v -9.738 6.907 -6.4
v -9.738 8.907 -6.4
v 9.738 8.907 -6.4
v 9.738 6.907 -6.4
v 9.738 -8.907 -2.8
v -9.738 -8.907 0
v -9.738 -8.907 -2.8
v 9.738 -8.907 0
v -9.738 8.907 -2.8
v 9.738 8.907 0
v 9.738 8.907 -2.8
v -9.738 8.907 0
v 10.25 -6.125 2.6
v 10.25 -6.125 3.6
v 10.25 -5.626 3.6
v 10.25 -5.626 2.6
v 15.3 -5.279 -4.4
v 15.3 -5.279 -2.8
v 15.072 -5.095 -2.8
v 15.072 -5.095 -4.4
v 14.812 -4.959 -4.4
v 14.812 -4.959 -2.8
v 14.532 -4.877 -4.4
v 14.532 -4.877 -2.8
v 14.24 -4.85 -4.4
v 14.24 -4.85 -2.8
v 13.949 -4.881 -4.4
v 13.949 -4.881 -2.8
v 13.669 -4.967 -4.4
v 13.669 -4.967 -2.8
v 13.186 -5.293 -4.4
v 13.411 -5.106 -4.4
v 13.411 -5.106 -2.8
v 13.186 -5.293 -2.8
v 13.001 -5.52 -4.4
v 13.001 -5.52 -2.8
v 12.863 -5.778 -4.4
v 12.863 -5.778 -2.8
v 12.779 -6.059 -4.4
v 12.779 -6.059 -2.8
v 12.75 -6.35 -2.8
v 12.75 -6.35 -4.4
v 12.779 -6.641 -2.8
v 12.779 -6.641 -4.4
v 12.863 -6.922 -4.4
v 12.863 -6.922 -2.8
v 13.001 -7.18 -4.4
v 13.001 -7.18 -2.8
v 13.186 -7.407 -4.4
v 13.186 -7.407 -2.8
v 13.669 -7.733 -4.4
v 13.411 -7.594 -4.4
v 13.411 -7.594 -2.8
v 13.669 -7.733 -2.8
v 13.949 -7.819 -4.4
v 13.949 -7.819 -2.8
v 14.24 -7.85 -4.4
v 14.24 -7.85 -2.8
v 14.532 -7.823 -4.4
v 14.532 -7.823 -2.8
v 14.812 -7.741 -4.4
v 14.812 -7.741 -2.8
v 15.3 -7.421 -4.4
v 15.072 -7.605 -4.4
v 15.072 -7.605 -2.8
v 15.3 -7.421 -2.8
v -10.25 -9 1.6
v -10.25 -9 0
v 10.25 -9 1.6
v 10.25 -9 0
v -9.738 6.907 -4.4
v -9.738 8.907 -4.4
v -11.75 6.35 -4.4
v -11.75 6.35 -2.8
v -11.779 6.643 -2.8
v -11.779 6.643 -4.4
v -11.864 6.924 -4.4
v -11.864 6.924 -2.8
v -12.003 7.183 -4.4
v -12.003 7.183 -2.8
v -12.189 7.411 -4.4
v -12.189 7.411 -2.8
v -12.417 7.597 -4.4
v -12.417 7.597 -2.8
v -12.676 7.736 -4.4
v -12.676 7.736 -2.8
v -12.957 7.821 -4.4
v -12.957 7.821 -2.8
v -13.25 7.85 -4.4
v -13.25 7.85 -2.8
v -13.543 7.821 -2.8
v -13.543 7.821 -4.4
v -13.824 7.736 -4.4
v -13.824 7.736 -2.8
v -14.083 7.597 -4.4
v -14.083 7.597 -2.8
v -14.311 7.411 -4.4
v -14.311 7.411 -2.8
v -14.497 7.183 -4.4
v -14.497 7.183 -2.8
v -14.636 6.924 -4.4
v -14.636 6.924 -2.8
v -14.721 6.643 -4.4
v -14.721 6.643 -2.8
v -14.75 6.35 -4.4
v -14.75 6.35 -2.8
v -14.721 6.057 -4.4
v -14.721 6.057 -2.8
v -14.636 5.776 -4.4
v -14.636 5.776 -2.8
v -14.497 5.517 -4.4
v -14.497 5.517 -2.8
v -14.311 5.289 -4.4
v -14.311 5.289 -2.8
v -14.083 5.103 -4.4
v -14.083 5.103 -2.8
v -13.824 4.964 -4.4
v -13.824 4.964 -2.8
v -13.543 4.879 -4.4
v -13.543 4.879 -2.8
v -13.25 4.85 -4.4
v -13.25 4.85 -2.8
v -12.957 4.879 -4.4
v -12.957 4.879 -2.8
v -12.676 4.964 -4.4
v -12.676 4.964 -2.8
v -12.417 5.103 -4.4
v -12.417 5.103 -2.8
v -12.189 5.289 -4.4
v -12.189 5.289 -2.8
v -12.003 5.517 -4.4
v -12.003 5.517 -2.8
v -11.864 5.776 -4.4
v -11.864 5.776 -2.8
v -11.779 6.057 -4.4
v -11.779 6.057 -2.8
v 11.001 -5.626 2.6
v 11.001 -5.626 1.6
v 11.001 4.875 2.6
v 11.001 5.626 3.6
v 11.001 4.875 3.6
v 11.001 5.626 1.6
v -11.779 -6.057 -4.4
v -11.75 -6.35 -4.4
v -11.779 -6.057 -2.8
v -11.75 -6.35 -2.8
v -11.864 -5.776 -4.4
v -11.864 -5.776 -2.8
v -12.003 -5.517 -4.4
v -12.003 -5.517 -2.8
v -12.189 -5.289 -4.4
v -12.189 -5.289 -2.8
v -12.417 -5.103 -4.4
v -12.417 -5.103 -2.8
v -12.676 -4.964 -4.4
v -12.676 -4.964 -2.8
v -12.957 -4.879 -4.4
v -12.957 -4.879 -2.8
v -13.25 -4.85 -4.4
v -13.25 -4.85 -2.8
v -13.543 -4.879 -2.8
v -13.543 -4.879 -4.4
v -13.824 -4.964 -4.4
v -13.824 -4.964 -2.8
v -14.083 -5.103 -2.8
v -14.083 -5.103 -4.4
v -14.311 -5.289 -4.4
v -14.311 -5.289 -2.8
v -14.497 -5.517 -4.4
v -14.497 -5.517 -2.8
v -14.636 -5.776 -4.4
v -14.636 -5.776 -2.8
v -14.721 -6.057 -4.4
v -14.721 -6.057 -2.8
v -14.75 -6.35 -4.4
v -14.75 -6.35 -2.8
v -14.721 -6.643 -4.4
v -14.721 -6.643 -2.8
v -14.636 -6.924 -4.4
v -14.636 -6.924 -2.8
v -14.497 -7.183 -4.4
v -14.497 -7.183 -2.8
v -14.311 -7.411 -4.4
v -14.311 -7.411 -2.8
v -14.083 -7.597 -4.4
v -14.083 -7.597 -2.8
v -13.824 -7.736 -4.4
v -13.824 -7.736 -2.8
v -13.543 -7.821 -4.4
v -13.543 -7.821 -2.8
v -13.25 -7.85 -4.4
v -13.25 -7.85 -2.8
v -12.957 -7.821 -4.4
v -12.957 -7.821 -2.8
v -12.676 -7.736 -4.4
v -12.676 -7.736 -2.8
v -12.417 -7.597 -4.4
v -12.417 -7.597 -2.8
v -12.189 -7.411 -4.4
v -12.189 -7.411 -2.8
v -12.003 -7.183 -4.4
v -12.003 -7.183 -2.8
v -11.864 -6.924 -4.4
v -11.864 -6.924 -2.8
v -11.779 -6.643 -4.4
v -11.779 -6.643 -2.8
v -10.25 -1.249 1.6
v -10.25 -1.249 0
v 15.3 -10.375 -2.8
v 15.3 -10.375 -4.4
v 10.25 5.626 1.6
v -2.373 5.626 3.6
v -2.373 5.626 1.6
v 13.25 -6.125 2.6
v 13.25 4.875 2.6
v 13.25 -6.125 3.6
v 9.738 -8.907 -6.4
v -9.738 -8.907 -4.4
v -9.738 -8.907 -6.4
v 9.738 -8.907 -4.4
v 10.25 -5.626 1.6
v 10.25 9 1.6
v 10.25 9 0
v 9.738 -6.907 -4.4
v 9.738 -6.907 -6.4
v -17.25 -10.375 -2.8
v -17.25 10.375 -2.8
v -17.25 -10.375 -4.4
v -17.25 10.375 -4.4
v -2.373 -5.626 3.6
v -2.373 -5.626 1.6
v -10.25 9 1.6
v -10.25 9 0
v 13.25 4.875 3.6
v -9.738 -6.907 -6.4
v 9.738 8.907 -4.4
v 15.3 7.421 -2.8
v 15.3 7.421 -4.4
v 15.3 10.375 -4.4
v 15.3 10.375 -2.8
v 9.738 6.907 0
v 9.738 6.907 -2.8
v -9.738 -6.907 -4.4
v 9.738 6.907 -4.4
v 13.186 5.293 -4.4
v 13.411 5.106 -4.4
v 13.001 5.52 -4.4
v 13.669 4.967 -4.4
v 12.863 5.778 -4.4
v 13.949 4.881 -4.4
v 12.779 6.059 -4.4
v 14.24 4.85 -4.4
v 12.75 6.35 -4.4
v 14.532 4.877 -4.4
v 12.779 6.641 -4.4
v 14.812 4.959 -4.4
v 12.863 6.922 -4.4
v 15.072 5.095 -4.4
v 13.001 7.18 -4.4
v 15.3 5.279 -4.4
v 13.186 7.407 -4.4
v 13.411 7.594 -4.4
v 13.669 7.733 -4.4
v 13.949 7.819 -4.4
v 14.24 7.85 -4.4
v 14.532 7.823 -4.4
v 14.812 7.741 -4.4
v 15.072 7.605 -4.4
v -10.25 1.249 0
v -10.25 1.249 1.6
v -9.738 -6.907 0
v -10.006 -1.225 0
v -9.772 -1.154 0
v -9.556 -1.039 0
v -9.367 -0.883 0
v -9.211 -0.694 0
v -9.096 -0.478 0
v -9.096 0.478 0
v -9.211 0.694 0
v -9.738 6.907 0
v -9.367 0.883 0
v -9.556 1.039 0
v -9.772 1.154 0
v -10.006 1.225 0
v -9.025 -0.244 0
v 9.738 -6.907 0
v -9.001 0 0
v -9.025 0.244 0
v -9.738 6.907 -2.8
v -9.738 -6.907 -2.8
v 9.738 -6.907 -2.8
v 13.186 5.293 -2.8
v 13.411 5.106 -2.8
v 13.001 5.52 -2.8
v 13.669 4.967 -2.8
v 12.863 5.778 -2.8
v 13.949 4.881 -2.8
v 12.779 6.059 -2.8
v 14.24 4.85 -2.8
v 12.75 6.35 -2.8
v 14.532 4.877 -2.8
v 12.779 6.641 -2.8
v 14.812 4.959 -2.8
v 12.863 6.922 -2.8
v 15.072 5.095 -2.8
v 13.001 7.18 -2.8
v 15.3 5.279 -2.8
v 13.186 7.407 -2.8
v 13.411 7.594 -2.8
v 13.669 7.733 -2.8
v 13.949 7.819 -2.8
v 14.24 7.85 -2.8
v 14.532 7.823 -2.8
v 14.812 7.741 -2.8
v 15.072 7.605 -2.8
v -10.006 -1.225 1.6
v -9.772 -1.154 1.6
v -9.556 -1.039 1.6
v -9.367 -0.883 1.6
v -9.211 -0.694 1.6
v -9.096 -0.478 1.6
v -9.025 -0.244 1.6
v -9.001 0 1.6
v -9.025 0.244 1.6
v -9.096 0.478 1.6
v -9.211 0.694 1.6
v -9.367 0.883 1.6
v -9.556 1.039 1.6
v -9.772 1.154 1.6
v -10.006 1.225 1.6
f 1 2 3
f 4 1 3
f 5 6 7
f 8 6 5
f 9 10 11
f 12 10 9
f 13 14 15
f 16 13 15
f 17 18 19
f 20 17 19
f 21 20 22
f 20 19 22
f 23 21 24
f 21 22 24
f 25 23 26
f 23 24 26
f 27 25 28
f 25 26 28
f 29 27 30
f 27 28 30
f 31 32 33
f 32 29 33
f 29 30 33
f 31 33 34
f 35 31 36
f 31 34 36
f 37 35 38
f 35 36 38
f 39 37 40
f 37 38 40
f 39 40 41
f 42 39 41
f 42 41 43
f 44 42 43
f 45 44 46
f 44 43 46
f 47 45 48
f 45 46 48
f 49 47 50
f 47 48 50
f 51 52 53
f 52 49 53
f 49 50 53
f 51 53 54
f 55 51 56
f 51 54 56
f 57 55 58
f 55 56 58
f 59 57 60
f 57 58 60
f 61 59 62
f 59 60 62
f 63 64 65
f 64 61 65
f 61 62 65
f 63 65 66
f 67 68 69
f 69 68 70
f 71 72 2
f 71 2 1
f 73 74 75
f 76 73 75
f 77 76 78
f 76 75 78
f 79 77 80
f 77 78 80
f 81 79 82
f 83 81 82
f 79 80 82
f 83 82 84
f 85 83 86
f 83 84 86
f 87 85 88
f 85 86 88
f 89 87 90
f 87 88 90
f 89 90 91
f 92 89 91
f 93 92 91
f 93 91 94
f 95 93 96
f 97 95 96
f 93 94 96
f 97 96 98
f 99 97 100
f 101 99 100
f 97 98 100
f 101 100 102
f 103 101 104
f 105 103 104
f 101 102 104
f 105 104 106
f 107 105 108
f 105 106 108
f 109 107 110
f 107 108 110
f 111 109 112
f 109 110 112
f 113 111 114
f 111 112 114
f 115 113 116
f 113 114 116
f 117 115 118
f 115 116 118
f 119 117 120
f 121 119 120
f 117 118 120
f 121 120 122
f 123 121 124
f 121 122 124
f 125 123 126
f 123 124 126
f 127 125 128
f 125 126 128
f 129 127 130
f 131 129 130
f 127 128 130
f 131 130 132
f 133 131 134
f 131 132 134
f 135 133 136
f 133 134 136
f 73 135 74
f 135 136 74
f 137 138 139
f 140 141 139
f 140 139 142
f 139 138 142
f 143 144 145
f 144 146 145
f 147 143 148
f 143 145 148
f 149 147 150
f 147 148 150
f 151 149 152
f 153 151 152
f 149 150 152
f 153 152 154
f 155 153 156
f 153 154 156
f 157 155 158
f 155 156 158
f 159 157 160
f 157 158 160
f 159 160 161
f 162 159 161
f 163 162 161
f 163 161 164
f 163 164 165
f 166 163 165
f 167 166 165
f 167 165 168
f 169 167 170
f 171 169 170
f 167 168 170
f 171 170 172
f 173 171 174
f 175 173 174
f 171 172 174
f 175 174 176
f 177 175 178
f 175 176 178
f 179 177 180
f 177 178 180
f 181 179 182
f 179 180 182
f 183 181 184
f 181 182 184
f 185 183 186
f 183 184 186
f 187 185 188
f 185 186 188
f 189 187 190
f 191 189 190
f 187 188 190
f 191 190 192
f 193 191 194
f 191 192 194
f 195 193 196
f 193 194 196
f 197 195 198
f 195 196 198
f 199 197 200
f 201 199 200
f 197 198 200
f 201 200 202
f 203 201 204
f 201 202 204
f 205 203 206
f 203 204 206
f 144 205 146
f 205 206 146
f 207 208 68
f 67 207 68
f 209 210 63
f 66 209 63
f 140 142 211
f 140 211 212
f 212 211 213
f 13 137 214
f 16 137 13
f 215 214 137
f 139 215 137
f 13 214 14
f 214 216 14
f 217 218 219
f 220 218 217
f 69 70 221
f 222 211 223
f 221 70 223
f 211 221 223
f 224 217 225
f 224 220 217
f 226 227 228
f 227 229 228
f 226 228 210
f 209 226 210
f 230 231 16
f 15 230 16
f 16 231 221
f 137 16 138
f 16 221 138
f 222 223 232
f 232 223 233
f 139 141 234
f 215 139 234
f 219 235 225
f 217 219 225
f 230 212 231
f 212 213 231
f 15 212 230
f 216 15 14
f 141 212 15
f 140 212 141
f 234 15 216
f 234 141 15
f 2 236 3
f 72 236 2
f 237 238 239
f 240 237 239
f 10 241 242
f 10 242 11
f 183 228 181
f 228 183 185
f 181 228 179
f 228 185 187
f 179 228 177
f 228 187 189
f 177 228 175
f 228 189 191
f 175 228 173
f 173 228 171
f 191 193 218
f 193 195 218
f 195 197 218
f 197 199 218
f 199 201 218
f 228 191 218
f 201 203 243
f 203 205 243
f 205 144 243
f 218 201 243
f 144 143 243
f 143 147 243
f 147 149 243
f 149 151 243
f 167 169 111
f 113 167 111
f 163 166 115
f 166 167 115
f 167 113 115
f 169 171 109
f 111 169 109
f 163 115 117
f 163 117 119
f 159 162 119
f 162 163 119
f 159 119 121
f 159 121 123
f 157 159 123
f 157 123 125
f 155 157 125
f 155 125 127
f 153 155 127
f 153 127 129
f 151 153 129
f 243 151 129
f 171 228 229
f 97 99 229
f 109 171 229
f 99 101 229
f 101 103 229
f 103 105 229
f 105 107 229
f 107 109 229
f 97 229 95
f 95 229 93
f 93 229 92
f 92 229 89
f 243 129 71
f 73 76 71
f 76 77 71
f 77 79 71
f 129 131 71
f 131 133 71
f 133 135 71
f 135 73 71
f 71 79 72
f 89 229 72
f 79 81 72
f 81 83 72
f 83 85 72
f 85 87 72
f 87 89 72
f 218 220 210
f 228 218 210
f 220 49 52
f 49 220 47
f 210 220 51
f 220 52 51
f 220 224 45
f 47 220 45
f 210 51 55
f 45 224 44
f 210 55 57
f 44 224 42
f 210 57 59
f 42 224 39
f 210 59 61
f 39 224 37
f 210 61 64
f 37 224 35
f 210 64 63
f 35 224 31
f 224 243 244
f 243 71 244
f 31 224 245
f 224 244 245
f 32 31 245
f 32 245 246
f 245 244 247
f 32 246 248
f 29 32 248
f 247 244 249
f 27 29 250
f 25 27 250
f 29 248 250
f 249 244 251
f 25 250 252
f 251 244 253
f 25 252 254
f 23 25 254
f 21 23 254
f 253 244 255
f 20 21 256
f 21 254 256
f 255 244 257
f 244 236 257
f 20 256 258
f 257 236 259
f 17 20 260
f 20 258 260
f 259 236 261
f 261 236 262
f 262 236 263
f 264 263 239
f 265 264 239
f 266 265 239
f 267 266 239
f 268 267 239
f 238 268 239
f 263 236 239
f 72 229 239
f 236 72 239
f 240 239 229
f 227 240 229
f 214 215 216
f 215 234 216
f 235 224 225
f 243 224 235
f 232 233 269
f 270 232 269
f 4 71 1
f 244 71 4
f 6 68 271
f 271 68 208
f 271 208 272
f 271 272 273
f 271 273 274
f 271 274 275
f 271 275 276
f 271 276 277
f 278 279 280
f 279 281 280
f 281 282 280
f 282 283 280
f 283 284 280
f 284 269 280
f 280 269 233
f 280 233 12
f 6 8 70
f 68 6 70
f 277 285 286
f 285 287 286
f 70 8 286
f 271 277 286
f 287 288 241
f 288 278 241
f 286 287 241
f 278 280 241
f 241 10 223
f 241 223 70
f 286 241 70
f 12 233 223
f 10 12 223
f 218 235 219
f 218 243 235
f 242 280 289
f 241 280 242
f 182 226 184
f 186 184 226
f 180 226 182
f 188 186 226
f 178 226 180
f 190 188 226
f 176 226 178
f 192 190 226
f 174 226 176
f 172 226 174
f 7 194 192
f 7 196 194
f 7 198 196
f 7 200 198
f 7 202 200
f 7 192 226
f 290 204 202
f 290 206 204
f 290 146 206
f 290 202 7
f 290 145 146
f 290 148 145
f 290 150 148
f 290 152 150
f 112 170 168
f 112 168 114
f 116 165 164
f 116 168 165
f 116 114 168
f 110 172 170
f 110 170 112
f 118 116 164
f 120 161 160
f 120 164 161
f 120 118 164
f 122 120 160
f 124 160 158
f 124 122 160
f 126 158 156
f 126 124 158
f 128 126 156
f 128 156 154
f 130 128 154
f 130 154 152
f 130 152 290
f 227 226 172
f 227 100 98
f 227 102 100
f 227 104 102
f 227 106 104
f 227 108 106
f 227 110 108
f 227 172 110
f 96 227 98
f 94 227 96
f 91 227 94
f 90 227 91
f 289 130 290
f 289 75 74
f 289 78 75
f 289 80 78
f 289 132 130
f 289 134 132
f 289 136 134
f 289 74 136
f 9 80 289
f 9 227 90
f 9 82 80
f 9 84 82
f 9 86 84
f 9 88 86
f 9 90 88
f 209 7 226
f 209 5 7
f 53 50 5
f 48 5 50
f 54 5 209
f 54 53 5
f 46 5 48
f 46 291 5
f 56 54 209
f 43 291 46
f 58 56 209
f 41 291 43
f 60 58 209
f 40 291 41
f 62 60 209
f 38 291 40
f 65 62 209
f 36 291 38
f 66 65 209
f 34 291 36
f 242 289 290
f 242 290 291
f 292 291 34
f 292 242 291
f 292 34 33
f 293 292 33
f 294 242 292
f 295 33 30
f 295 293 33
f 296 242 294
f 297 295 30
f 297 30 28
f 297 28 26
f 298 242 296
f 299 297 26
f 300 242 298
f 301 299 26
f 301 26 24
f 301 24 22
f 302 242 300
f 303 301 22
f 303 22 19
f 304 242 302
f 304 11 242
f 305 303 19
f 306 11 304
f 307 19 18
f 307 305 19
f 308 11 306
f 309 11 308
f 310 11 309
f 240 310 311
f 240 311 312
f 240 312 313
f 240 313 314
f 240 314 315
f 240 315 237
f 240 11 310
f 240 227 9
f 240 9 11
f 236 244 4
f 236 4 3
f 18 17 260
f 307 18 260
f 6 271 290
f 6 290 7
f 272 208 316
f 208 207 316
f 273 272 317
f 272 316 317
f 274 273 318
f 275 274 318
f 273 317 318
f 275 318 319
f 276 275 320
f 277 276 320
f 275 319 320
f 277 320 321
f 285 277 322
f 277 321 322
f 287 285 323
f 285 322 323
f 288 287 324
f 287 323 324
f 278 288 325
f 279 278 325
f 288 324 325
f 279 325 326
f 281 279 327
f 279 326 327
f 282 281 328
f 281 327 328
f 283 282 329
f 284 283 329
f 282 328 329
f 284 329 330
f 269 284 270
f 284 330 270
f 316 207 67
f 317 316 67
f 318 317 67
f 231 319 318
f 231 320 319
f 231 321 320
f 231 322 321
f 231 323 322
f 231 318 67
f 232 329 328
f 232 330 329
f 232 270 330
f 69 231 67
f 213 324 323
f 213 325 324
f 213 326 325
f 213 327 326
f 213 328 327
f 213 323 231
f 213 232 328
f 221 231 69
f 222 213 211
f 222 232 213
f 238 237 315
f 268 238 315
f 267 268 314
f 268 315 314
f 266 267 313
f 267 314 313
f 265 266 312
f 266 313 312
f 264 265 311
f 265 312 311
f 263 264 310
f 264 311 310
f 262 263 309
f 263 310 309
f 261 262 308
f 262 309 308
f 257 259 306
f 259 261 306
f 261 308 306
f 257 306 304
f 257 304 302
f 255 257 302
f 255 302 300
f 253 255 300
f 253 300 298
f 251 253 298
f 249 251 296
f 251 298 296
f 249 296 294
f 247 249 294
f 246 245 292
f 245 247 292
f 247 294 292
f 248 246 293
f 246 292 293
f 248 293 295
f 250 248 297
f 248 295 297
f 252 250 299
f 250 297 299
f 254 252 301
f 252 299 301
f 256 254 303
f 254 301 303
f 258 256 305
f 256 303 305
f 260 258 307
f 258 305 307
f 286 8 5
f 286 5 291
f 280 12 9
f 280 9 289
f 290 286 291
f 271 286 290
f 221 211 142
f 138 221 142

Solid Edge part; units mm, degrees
sketch "Sketch1" plane through (0, 0, 0) normal (0, 0, 1) x (1, 0, 0)
  line L0 (-10.25, 9) -> (-10.25, -9)
  line L1 (-10.25, -9) -> (10.25, -9)
  line L2 (10.25, -9) -> (10.25, 9)
  line L3 (10.25, 9) -> (-10.25, 9)
extrude "Protrusion1" add sketch "Sketch1" along normal blind 1.6
sketch "Sketch2" plane through (0, 0, 1.6) normal (0, 0, 1) x (1, 0, 0)
  circle A0 centre (-10.25, 0) radius 1.2493
extrude "Cutout1" cut sketch "Sketch2" against normal up to vertex (1.6 mm away)
sketch "Sketch3" plane through (0, 0, 1.6) normal (0, 0, 1) x (1, 0, 0)
  line L0 (9.738, 8.9066) -> (-9.738, 8.9066)
  line L1 (-9.738, 8.9066) -> (-9.738, 6.9066)
  line L2 (-9.738, 6.9066) -> (9.738, 6.9066)
  line L3 (9.738, 6.9066) -> (9.738, 8.9066)
  line L4 (9.738, -8.9066) -> (9.738, -6.9066)
  line L5 (9.738, -6.9066) -> (-9.738, -6.9066)
  line L6 (-9.738, -6.9066) -> (-9.738, -8.9066)
  line L7 (-9.738, -8.9066) -> (9.738, -8.9066)
  dimension "D1" = 2
extrude "ExtrudedProtrusion_2" add sketch "Sketch3" against normal blind 8
sketch "Sketch4" plane through (0, 0, 1.6) normal (0, 0, 1) x (1, 0, 0)
  line L0 (11.0007, 5.6262) -> (-2.3727, 5.6262)
  line L1 (-2.3727, 5.6262) -> (-2.3727, -5.6262)
  line L2 (-2.3727, -5.6262) -> (11.0007, -5.6262)
  line L3 (11.0007, -5.6262) -> (11.0007, 5.6262)
extrude "ExtrudedProtrusion_3" add sketch "Sketch4" along normal blind 2
sketch "Sketch5" plane through (0, 0, -4.4) normal (0, 0, 1) x (1, 0, 0)
  line L0 (15.3, -10.375) -> (15.3, 10.375)
  line L1 (15.3, 10.375) -> (-17.25, 10.375)
  line L2 (-17.25, 10.375) -> (-17.25, -10.375)
  line L3 (-17.25, -10.375) -> (15.3, -10.375)
extrude "ExtrudedProtrusion_4" add sketch "Sketch5" along normal blind 1.6
sketch "Sketch6" plane through (-0.975, 0, -2.8) normal (0, 0, 1) x (1, 0, 0)
  circle A0 centre (-12.275, 6.35) radius 1.5
  circle A1 centre (-12.275, -6.35) radius 1.5
  arc A2 (13.8632, -5.7211) -> (16.275, -5.2788) centre (15.225, -6.35) cw
  line L0 (16.275, -7.4212) -> (16.275, -5.2788)
  arc A3 (16.275, -7.4212) -> (13.8632, -5.7211) centre (15.225, -6.35) cw
  arc A4 (16.275, 5.2788) -> (16.275, 7.4212) centre (15.225, 6.35) cw
  line L1 (16.275, 5.2788) -> (16.275, 7.4212)
extrude "Cutout2" cut sketch "Sketch6" against normal up to vertex (1.6 mm away)
sketch "Sketch7" plane through (4.314, 0, 3.6) normal (0, 0, 1) x (0, -1, 0)
  line L0 (-4.875, 8.936) -> (6.125, 8.936)
  line L1 (6.125, 8.936) -> (6.125, 5.936)
  line L2 (6.125, 5.936) -> (-4.875, 5.936)
  line L3 (-4.875, 5.936) -> (-4.875, 8.936)
extrude "ExtrudedProtrusion_5" add sketch "Sketch7" against normal blind 1
properties material "Steel"
